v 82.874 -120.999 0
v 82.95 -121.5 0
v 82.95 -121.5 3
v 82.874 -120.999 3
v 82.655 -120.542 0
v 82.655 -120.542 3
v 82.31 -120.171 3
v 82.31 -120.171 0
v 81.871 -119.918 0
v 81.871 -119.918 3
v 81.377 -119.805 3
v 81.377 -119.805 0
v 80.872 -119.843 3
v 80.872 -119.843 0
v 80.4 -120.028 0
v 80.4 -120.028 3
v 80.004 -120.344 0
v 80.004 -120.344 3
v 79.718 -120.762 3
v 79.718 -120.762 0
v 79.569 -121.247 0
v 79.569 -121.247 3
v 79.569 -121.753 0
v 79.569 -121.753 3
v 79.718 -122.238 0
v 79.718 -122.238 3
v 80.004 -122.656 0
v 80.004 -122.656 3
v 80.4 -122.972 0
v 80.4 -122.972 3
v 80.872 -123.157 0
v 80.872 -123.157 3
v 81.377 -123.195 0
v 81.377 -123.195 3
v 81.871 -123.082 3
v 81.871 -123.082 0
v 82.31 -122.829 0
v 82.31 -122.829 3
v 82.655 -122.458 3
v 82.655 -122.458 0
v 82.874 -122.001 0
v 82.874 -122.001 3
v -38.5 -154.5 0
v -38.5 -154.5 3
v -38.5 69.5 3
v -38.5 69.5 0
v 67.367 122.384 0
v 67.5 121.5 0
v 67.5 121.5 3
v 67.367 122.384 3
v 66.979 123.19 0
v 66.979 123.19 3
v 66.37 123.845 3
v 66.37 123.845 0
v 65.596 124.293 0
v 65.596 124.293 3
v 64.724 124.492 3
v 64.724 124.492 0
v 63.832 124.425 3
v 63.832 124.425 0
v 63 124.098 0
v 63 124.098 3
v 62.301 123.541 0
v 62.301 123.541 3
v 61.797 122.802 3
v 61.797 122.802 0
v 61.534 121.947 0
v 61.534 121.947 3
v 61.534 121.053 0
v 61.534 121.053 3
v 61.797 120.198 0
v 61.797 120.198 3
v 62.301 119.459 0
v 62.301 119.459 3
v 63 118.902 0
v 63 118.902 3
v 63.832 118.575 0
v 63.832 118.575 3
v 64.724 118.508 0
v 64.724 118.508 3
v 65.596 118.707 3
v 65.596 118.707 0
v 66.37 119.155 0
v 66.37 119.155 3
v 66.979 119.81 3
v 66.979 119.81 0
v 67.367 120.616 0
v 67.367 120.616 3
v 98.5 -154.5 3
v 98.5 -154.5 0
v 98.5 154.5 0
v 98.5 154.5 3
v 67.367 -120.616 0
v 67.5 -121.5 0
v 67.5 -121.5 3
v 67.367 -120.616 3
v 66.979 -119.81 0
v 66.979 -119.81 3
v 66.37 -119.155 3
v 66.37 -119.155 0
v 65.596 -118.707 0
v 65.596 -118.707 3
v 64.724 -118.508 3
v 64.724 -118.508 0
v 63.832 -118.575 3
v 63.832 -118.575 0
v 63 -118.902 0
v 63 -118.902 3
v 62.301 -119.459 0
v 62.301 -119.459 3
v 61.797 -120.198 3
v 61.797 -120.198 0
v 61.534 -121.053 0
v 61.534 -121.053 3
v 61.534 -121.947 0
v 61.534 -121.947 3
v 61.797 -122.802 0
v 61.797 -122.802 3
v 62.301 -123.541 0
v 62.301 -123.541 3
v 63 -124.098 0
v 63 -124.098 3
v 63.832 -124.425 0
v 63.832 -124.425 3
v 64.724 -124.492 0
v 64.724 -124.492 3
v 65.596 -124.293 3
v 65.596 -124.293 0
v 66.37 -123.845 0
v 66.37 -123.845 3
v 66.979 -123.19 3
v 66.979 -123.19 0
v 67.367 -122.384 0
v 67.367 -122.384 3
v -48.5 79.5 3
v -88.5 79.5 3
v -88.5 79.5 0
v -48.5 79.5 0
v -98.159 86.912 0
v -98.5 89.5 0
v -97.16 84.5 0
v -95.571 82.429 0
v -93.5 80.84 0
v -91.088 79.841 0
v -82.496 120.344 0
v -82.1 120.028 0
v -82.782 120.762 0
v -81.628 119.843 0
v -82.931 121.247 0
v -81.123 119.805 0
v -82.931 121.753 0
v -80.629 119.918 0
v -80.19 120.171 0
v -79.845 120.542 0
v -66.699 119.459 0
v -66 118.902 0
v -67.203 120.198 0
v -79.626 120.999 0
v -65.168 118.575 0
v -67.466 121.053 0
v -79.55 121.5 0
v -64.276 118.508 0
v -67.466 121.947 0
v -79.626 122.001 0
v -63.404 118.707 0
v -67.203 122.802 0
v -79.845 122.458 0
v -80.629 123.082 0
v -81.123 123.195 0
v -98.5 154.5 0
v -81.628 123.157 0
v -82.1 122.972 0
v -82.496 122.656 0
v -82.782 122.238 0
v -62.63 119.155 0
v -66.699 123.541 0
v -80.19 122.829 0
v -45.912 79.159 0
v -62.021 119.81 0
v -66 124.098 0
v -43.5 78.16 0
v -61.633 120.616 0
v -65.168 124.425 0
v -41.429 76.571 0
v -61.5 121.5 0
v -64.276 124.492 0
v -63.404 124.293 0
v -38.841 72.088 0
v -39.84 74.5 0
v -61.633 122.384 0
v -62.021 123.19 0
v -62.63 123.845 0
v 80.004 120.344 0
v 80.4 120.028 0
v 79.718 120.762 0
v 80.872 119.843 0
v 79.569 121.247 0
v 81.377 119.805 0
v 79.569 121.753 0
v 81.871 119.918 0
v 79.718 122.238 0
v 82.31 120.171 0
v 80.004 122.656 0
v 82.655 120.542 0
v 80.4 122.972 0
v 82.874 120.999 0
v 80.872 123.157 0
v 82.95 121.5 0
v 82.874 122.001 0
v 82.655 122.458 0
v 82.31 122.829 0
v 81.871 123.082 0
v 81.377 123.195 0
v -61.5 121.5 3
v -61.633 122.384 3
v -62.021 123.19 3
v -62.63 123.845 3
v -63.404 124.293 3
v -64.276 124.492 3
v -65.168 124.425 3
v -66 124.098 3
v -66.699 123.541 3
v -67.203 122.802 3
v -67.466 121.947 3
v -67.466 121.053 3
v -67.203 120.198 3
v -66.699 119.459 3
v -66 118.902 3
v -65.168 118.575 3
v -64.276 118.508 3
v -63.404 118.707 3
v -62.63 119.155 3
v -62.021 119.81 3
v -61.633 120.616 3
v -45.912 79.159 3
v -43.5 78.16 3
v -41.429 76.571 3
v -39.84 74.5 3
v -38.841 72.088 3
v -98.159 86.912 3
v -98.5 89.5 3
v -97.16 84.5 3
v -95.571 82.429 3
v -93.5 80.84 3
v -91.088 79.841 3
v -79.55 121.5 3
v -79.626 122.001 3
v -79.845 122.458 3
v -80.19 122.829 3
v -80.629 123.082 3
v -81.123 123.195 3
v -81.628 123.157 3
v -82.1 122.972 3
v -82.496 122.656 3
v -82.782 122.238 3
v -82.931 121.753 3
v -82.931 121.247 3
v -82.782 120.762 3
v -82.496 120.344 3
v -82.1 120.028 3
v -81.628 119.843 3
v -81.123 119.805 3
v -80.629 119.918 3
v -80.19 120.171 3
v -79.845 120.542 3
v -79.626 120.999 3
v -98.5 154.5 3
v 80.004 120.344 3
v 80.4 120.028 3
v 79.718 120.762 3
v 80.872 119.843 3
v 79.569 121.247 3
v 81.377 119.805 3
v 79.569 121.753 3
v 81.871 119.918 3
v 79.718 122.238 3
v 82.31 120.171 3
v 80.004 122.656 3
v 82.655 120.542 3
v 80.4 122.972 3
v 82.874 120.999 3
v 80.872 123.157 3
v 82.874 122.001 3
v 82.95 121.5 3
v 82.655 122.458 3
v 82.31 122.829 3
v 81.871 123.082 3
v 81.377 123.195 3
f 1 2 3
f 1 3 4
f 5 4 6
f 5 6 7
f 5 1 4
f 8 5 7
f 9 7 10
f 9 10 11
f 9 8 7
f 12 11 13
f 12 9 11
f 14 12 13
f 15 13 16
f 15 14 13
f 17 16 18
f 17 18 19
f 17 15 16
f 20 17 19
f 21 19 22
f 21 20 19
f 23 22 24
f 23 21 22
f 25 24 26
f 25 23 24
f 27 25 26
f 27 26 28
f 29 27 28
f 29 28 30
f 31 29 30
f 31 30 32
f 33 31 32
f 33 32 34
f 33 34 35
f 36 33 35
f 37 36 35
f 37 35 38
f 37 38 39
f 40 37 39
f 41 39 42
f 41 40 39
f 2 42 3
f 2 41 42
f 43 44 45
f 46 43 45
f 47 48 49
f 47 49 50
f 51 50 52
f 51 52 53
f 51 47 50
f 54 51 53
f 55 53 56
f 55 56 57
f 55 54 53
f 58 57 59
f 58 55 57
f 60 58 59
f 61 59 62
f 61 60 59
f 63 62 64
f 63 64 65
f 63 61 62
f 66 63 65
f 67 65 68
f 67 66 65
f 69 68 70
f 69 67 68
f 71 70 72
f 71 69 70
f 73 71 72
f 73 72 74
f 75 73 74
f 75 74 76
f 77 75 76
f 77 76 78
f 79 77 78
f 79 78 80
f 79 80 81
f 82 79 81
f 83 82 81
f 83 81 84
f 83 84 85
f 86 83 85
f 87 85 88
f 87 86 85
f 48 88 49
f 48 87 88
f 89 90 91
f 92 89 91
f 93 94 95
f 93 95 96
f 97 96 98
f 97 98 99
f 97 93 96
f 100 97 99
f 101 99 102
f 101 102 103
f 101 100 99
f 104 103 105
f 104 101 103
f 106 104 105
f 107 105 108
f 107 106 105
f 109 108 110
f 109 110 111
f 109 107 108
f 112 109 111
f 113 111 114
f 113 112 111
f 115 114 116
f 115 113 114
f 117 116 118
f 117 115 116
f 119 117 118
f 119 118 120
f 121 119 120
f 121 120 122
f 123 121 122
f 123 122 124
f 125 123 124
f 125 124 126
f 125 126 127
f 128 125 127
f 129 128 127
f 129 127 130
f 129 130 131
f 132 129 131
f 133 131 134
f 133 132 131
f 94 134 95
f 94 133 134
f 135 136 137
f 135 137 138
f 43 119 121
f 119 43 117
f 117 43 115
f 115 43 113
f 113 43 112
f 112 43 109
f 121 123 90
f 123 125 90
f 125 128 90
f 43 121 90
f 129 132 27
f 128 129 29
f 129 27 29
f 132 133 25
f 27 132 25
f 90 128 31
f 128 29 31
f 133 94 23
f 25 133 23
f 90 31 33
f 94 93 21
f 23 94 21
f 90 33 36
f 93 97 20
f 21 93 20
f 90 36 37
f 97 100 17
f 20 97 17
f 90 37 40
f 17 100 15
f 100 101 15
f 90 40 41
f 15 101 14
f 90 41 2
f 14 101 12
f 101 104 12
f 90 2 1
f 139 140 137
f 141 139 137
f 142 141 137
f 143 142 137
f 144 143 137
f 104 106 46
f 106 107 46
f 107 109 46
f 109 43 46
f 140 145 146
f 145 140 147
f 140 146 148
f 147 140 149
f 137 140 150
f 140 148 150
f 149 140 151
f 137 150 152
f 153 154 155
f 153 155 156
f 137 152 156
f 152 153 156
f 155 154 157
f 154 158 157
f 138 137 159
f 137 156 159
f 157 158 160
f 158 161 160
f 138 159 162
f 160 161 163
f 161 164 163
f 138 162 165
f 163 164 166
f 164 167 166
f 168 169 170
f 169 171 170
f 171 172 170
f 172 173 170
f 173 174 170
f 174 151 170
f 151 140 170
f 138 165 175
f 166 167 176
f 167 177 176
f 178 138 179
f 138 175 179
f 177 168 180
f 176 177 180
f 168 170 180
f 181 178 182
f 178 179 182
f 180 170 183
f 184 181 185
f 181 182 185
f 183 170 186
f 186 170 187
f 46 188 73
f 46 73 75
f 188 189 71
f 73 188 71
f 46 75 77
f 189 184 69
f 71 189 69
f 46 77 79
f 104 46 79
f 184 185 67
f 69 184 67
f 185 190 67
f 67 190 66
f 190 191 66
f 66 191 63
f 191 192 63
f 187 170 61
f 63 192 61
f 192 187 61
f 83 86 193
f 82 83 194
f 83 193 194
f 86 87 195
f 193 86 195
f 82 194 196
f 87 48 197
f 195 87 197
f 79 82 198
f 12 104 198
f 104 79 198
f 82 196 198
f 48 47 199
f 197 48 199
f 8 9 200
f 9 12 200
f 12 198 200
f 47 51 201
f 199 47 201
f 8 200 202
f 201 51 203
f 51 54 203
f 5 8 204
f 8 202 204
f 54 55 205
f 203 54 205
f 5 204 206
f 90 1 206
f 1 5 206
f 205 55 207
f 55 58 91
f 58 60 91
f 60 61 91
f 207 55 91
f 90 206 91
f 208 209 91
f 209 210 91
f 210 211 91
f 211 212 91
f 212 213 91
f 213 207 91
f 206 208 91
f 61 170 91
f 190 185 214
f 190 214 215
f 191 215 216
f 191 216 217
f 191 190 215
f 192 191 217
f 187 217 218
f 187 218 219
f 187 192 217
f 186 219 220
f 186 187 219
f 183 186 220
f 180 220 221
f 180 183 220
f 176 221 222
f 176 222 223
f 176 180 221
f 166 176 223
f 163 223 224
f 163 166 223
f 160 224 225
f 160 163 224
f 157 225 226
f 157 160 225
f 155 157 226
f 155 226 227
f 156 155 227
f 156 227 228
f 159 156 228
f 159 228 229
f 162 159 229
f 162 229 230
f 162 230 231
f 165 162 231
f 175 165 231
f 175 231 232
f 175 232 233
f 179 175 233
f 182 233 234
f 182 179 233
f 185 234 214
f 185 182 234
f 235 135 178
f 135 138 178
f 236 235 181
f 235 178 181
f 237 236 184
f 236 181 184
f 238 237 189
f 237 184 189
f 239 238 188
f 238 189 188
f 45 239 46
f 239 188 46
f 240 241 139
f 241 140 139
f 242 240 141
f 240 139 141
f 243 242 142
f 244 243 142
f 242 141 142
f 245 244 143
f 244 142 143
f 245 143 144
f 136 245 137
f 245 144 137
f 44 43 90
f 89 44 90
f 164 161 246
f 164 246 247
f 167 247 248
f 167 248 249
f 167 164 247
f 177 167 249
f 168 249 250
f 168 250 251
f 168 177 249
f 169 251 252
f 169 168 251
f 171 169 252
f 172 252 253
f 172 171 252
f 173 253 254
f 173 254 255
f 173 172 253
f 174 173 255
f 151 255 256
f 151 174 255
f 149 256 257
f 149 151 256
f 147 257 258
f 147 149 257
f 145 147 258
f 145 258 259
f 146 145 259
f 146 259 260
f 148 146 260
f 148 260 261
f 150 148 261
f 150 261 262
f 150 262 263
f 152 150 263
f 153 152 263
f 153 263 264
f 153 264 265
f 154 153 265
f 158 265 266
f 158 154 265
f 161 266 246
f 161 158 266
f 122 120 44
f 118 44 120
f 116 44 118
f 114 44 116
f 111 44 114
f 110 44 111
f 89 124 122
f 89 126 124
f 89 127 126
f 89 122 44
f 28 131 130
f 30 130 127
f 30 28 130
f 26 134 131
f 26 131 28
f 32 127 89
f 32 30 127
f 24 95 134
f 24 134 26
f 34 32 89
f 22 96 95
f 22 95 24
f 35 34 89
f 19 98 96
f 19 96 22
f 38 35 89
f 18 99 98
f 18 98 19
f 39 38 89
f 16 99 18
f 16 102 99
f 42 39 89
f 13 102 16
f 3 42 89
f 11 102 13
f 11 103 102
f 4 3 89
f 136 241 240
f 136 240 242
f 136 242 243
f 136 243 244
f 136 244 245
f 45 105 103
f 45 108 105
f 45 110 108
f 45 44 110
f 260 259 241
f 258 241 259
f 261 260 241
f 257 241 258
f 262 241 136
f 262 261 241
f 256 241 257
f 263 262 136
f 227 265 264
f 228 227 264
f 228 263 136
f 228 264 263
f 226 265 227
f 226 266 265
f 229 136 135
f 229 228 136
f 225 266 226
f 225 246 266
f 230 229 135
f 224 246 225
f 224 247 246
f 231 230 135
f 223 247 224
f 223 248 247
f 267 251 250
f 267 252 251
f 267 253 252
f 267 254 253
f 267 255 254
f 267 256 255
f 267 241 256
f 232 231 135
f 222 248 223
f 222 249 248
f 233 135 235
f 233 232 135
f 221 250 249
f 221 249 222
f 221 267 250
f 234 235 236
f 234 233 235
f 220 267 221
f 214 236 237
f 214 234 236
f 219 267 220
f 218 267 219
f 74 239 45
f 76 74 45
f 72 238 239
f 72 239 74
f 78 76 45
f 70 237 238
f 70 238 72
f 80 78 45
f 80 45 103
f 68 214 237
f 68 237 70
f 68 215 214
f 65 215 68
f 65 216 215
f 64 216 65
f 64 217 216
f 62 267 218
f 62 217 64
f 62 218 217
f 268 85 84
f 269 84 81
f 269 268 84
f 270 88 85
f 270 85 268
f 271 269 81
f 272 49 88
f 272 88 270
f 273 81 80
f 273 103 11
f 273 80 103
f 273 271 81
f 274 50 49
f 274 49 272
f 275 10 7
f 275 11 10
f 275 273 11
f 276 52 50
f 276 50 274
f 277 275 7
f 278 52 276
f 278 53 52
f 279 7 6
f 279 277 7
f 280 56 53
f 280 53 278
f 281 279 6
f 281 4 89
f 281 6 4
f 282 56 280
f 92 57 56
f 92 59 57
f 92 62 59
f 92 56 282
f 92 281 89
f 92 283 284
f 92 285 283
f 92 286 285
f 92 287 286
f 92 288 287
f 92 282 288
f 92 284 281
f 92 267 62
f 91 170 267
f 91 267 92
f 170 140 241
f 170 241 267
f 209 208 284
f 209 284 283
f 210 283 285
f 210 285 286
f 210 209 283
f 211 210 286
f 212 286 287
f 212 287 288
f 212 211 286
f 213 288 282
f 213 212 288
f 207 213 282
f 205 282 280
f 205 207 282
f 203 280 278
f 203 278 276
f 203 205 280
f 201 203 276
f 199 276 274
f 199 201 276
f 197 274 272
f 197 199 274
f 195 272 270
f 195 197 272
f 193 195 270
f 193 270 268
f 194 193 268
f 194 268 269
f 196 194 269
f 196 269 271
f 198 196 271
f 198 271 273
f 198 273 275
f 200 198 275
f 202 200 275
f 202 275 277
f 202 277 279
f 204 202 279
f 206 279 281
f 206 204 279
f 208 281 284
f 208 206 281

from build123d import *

# Parameters (mm, degrees)
ESQUISSE1_W             = 197
ESQUISSE1_H             = 309
ESQUISSE1_R             = 1.7
ESQUISSE1_R_2           = 3
BOSS_EXTRU_1_DEPTH      = 3
ESQUISSE2_W             = 60
ESQUISSE2_H             = 234
ENL_V_MAT_EXTRU_1_DEPTH = 4
CONG_1_R                = 10


with BuildPart() as part:
    # Esquisse1 → Boss.-Extru.1 (new body)
    with BuildSketch(Plane.XY):
        Rectangle(ESQUISSE1_W, ESQUISSE1_H)
        with Locations((81.25, 121.5)):
            Circle(ESQUISSE1_R, mode=Mode.SUBTRACT)
        with Locations((64.5, 121.5)):
            Circle(ESQUISSE1_R_2, mode=Mode.SUBTRACT)
        with Locations((81.25, -121.5)):
            Circle(ESQUISSE1_R, mode=Mode.SUBTRACT)
        with Locations((64.5, -121.5)):
            Circle(ESQUISSE1_R_2, mode=Mode.SUBTRACT)
        with Locations((-81.25, -121.5)):
            Circle(ESQUISSE1_R, mode=Mode.SUBTRACT)
        with Locations((-64.5, -121.5)):
            Circle(ESQUISSE1_R_2, mode=Mode.SUBTRACT)
        with Locations((-81.25, 121.5)):
            Circle(ESQUISSE1_R, mode=Mode.SUBTRACT)
        with Locations((-64.5, 121.5)):
            Circle(ESQUISSE1_R_2, mode=Mode.SUBTRACT)
    extrude(amount=BOSS_EXTRU_1_DEPTH)

    # Esquisse2 → Enlèv. mat.-Extru.1 (cut, through all)
    with BuildSketch(Plane.XY.offset(3)):
        with Locations((-68.5, -37.5)):
            Rectangle(ESQUISSE2_W, ESQUISSE2_H)
    extrude(amount=-ENL_V_MAT_EXTRU_1_DEPTH, mode=Mode.SUBTRACT)

    # Congé1
    cong_1_edges = [part.edges().sort_by_distance(p)[0] for p in [
        (-98.5, 79.5, 1.5),
        (-38.5, 79.5, 1.5),
    ]]
    fillet(cong_1_edges, radius=CONG_1_R)


solid = part.part
